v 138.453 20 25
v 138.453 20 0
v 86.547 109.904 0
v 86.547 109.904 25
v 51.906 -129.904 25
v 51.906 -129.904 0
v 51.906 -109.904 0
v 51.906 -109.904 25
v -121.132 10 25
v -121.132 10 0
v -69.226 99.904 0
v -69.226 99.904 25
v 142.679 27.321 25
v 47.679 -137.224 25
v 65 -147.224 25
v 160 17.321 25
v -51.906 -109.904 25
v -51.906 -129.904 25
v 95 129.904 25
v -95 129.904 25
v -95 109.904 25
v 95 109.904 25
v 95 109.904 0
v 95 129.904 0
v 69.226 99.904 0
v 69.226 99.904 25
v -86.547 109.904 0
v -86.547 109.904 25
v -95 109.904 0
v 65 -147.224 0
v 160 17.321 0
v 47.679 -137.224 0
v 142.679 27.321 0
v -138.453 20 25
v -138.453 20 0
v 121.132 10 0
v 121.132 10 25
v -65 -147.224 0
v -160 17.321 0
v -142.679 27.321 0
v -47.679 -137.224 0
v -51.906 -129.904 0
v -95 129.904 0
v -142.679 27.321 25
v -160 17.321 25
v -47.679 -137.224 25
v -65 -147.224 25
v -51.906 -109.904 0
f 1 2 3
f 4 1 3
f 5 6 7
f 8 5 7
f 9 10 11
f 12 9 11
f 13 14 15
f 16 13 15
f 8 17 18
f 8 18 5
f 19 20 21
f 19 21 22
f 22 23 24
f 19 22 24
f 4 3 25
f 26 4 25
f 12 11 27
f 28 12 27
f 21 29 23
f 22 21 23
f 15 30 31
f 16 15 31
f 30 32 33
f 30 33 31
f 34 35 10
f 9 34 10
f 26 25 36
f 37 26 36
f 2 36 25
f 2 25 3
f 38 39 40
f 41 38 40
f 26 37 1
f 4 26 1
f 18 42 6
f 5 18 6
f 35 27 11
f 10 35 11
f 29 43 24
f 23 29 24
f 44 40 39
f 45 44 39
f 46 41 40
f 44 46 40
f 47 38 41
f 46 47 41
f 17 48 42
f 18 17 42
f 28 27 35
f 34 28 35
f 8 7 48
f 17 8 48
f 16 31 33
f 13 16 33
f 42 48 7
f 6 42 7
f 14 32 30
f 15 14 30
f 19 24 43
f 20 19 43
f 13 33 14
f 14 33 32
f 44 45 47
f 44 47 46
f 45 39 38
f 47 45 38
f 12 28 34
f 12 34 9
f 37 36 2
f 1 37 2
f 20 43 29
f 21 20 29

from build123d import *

# Parameters (mm, degrees)
F1_DEPTH = 25


with BuildPart() as f1:
    # F0 (on Top) → F1 (new body)
    with BuildSketch(Plane.XY):
        Polygon((95, 129.9038105677), (0, 129.9038105677), (-51.9059892324, 129.9038105677), (-63.4529946162, 109.9038105677), (86.5470053838, 109.9038105677), (95, 109.9038105677), align=None)
        Polygon((-63.4529946162, 109.9038105677), (-51.9059892324, 129.9038105677), (-75, 129.9038105677), (-86.5470053838, 109.9038105677), align=None)
        Polygon((-86.5470053838, 109.9038105677), (-75, 129.9038105677), (-95, 129.9038105677), (-95, 109.9038105677), align=None)
    extrude(amount=F1_DEPTH)


with BuildPart() as f1b:
    # F0 (on Top) → F1, piece 2 (new body)
    with BuildSketch(Plane.XY):
        Polygon((-69.2264973081, 99.9038105677), (-86.5470053838, 109.9038105677), (-112.5, 64.9519052838), (-138.4529946162, 20), (-121.1324865405, 10), align=None)
    extrude(amount=F1_DEPTH)


with BuildPart() as f1c:
    # F0 (on Top) → F1, piece 3 (new body)
    with BuildSketch(Plane.XY):
        Polygon((-63.4529946162, -109.9038105677), (-126.9059892324, 0), (-138.4529946162, -20), (-112.5, -64.9519052838), (-86.5470053838, -109.9038105677), align=None)
        Polygon((-126.9059892324, 0), (-138.4529946162, 20), (-150, 0), (-138.4529946162, -20), align=None)
        Polygon((-150, 0), (-138.4529946162, 20), (-142.6794919243, 27.3205080757), (-160, 17.3205080757), align=None)
        Polygon((-47.6794919243, -137.2243186434), (-51.9059892324, -129.9038105677), (-75, -129.9038105677), (-65, -147.2243186434), align=None)
        Polygon((-51.9059892324, -129.9038105677), (-63.4529946162, -109.9038105677), (-86.5470053838, -109.9038105677), (-75, -129.9038105677), align=None)
    extrude(amount=F1_DEPTH)


with BuildPart() as f1d:
    # F0 (on Top) → F1, piece 4 (new body)
    with BuildSketch(Plane.XY):
        Polygon((0, -129.9038105677), (51.9059892324, -129.9038105677), (51.9059892324, -109.9038105677), (-51.9059892324, -109.9038105677), (-51.9059892324, -129.9038105677), align=None)
    extrude(amount=F1_DEPTH)


with BuildPart() as f1e:
    # F0 (on Top) → F1, piece 5 (new body)
    with BuildSketch(Plane.XY):
        Polygon((142.6794919243, 27.3205080757), (138.4529946162, 20), (63.4529946162, -109.9038105677), (86.5470053838, -109.9038105677), (112.5, -64.9519052838), (160, 17.3205080757), align=None)
        Polygon((86.5470053838, -109.9038105677), (63.4529946162, -109.9038105677), (51.9059892324, -129.9038105677), (75, -129.9038105677), align=None)
        Polygon((75, -129.9038105677), (51.9059892324, -129.9038105677), (47.6794919243, -137.2243186434), (65, -147.2243186434), align=None)
    extrude(amount=F1_DEPTH)


with BuildPart() as f1f:
    # F0 (on Top) → F1, piece 6 (new body)
    with BuildSketch(Plane.XY):
        Polygon((138.4529946162, 20), (86.5470053838, 109.9038105677), (69.2264973081, 99.9038105677), (121.1324865405, 10), align=None)
    extrude(amount=F1_DEPTH)


solid = Compound([f1.part, f1b.part, f1c.part, f1d.part, f1e.part, f1f.part])
